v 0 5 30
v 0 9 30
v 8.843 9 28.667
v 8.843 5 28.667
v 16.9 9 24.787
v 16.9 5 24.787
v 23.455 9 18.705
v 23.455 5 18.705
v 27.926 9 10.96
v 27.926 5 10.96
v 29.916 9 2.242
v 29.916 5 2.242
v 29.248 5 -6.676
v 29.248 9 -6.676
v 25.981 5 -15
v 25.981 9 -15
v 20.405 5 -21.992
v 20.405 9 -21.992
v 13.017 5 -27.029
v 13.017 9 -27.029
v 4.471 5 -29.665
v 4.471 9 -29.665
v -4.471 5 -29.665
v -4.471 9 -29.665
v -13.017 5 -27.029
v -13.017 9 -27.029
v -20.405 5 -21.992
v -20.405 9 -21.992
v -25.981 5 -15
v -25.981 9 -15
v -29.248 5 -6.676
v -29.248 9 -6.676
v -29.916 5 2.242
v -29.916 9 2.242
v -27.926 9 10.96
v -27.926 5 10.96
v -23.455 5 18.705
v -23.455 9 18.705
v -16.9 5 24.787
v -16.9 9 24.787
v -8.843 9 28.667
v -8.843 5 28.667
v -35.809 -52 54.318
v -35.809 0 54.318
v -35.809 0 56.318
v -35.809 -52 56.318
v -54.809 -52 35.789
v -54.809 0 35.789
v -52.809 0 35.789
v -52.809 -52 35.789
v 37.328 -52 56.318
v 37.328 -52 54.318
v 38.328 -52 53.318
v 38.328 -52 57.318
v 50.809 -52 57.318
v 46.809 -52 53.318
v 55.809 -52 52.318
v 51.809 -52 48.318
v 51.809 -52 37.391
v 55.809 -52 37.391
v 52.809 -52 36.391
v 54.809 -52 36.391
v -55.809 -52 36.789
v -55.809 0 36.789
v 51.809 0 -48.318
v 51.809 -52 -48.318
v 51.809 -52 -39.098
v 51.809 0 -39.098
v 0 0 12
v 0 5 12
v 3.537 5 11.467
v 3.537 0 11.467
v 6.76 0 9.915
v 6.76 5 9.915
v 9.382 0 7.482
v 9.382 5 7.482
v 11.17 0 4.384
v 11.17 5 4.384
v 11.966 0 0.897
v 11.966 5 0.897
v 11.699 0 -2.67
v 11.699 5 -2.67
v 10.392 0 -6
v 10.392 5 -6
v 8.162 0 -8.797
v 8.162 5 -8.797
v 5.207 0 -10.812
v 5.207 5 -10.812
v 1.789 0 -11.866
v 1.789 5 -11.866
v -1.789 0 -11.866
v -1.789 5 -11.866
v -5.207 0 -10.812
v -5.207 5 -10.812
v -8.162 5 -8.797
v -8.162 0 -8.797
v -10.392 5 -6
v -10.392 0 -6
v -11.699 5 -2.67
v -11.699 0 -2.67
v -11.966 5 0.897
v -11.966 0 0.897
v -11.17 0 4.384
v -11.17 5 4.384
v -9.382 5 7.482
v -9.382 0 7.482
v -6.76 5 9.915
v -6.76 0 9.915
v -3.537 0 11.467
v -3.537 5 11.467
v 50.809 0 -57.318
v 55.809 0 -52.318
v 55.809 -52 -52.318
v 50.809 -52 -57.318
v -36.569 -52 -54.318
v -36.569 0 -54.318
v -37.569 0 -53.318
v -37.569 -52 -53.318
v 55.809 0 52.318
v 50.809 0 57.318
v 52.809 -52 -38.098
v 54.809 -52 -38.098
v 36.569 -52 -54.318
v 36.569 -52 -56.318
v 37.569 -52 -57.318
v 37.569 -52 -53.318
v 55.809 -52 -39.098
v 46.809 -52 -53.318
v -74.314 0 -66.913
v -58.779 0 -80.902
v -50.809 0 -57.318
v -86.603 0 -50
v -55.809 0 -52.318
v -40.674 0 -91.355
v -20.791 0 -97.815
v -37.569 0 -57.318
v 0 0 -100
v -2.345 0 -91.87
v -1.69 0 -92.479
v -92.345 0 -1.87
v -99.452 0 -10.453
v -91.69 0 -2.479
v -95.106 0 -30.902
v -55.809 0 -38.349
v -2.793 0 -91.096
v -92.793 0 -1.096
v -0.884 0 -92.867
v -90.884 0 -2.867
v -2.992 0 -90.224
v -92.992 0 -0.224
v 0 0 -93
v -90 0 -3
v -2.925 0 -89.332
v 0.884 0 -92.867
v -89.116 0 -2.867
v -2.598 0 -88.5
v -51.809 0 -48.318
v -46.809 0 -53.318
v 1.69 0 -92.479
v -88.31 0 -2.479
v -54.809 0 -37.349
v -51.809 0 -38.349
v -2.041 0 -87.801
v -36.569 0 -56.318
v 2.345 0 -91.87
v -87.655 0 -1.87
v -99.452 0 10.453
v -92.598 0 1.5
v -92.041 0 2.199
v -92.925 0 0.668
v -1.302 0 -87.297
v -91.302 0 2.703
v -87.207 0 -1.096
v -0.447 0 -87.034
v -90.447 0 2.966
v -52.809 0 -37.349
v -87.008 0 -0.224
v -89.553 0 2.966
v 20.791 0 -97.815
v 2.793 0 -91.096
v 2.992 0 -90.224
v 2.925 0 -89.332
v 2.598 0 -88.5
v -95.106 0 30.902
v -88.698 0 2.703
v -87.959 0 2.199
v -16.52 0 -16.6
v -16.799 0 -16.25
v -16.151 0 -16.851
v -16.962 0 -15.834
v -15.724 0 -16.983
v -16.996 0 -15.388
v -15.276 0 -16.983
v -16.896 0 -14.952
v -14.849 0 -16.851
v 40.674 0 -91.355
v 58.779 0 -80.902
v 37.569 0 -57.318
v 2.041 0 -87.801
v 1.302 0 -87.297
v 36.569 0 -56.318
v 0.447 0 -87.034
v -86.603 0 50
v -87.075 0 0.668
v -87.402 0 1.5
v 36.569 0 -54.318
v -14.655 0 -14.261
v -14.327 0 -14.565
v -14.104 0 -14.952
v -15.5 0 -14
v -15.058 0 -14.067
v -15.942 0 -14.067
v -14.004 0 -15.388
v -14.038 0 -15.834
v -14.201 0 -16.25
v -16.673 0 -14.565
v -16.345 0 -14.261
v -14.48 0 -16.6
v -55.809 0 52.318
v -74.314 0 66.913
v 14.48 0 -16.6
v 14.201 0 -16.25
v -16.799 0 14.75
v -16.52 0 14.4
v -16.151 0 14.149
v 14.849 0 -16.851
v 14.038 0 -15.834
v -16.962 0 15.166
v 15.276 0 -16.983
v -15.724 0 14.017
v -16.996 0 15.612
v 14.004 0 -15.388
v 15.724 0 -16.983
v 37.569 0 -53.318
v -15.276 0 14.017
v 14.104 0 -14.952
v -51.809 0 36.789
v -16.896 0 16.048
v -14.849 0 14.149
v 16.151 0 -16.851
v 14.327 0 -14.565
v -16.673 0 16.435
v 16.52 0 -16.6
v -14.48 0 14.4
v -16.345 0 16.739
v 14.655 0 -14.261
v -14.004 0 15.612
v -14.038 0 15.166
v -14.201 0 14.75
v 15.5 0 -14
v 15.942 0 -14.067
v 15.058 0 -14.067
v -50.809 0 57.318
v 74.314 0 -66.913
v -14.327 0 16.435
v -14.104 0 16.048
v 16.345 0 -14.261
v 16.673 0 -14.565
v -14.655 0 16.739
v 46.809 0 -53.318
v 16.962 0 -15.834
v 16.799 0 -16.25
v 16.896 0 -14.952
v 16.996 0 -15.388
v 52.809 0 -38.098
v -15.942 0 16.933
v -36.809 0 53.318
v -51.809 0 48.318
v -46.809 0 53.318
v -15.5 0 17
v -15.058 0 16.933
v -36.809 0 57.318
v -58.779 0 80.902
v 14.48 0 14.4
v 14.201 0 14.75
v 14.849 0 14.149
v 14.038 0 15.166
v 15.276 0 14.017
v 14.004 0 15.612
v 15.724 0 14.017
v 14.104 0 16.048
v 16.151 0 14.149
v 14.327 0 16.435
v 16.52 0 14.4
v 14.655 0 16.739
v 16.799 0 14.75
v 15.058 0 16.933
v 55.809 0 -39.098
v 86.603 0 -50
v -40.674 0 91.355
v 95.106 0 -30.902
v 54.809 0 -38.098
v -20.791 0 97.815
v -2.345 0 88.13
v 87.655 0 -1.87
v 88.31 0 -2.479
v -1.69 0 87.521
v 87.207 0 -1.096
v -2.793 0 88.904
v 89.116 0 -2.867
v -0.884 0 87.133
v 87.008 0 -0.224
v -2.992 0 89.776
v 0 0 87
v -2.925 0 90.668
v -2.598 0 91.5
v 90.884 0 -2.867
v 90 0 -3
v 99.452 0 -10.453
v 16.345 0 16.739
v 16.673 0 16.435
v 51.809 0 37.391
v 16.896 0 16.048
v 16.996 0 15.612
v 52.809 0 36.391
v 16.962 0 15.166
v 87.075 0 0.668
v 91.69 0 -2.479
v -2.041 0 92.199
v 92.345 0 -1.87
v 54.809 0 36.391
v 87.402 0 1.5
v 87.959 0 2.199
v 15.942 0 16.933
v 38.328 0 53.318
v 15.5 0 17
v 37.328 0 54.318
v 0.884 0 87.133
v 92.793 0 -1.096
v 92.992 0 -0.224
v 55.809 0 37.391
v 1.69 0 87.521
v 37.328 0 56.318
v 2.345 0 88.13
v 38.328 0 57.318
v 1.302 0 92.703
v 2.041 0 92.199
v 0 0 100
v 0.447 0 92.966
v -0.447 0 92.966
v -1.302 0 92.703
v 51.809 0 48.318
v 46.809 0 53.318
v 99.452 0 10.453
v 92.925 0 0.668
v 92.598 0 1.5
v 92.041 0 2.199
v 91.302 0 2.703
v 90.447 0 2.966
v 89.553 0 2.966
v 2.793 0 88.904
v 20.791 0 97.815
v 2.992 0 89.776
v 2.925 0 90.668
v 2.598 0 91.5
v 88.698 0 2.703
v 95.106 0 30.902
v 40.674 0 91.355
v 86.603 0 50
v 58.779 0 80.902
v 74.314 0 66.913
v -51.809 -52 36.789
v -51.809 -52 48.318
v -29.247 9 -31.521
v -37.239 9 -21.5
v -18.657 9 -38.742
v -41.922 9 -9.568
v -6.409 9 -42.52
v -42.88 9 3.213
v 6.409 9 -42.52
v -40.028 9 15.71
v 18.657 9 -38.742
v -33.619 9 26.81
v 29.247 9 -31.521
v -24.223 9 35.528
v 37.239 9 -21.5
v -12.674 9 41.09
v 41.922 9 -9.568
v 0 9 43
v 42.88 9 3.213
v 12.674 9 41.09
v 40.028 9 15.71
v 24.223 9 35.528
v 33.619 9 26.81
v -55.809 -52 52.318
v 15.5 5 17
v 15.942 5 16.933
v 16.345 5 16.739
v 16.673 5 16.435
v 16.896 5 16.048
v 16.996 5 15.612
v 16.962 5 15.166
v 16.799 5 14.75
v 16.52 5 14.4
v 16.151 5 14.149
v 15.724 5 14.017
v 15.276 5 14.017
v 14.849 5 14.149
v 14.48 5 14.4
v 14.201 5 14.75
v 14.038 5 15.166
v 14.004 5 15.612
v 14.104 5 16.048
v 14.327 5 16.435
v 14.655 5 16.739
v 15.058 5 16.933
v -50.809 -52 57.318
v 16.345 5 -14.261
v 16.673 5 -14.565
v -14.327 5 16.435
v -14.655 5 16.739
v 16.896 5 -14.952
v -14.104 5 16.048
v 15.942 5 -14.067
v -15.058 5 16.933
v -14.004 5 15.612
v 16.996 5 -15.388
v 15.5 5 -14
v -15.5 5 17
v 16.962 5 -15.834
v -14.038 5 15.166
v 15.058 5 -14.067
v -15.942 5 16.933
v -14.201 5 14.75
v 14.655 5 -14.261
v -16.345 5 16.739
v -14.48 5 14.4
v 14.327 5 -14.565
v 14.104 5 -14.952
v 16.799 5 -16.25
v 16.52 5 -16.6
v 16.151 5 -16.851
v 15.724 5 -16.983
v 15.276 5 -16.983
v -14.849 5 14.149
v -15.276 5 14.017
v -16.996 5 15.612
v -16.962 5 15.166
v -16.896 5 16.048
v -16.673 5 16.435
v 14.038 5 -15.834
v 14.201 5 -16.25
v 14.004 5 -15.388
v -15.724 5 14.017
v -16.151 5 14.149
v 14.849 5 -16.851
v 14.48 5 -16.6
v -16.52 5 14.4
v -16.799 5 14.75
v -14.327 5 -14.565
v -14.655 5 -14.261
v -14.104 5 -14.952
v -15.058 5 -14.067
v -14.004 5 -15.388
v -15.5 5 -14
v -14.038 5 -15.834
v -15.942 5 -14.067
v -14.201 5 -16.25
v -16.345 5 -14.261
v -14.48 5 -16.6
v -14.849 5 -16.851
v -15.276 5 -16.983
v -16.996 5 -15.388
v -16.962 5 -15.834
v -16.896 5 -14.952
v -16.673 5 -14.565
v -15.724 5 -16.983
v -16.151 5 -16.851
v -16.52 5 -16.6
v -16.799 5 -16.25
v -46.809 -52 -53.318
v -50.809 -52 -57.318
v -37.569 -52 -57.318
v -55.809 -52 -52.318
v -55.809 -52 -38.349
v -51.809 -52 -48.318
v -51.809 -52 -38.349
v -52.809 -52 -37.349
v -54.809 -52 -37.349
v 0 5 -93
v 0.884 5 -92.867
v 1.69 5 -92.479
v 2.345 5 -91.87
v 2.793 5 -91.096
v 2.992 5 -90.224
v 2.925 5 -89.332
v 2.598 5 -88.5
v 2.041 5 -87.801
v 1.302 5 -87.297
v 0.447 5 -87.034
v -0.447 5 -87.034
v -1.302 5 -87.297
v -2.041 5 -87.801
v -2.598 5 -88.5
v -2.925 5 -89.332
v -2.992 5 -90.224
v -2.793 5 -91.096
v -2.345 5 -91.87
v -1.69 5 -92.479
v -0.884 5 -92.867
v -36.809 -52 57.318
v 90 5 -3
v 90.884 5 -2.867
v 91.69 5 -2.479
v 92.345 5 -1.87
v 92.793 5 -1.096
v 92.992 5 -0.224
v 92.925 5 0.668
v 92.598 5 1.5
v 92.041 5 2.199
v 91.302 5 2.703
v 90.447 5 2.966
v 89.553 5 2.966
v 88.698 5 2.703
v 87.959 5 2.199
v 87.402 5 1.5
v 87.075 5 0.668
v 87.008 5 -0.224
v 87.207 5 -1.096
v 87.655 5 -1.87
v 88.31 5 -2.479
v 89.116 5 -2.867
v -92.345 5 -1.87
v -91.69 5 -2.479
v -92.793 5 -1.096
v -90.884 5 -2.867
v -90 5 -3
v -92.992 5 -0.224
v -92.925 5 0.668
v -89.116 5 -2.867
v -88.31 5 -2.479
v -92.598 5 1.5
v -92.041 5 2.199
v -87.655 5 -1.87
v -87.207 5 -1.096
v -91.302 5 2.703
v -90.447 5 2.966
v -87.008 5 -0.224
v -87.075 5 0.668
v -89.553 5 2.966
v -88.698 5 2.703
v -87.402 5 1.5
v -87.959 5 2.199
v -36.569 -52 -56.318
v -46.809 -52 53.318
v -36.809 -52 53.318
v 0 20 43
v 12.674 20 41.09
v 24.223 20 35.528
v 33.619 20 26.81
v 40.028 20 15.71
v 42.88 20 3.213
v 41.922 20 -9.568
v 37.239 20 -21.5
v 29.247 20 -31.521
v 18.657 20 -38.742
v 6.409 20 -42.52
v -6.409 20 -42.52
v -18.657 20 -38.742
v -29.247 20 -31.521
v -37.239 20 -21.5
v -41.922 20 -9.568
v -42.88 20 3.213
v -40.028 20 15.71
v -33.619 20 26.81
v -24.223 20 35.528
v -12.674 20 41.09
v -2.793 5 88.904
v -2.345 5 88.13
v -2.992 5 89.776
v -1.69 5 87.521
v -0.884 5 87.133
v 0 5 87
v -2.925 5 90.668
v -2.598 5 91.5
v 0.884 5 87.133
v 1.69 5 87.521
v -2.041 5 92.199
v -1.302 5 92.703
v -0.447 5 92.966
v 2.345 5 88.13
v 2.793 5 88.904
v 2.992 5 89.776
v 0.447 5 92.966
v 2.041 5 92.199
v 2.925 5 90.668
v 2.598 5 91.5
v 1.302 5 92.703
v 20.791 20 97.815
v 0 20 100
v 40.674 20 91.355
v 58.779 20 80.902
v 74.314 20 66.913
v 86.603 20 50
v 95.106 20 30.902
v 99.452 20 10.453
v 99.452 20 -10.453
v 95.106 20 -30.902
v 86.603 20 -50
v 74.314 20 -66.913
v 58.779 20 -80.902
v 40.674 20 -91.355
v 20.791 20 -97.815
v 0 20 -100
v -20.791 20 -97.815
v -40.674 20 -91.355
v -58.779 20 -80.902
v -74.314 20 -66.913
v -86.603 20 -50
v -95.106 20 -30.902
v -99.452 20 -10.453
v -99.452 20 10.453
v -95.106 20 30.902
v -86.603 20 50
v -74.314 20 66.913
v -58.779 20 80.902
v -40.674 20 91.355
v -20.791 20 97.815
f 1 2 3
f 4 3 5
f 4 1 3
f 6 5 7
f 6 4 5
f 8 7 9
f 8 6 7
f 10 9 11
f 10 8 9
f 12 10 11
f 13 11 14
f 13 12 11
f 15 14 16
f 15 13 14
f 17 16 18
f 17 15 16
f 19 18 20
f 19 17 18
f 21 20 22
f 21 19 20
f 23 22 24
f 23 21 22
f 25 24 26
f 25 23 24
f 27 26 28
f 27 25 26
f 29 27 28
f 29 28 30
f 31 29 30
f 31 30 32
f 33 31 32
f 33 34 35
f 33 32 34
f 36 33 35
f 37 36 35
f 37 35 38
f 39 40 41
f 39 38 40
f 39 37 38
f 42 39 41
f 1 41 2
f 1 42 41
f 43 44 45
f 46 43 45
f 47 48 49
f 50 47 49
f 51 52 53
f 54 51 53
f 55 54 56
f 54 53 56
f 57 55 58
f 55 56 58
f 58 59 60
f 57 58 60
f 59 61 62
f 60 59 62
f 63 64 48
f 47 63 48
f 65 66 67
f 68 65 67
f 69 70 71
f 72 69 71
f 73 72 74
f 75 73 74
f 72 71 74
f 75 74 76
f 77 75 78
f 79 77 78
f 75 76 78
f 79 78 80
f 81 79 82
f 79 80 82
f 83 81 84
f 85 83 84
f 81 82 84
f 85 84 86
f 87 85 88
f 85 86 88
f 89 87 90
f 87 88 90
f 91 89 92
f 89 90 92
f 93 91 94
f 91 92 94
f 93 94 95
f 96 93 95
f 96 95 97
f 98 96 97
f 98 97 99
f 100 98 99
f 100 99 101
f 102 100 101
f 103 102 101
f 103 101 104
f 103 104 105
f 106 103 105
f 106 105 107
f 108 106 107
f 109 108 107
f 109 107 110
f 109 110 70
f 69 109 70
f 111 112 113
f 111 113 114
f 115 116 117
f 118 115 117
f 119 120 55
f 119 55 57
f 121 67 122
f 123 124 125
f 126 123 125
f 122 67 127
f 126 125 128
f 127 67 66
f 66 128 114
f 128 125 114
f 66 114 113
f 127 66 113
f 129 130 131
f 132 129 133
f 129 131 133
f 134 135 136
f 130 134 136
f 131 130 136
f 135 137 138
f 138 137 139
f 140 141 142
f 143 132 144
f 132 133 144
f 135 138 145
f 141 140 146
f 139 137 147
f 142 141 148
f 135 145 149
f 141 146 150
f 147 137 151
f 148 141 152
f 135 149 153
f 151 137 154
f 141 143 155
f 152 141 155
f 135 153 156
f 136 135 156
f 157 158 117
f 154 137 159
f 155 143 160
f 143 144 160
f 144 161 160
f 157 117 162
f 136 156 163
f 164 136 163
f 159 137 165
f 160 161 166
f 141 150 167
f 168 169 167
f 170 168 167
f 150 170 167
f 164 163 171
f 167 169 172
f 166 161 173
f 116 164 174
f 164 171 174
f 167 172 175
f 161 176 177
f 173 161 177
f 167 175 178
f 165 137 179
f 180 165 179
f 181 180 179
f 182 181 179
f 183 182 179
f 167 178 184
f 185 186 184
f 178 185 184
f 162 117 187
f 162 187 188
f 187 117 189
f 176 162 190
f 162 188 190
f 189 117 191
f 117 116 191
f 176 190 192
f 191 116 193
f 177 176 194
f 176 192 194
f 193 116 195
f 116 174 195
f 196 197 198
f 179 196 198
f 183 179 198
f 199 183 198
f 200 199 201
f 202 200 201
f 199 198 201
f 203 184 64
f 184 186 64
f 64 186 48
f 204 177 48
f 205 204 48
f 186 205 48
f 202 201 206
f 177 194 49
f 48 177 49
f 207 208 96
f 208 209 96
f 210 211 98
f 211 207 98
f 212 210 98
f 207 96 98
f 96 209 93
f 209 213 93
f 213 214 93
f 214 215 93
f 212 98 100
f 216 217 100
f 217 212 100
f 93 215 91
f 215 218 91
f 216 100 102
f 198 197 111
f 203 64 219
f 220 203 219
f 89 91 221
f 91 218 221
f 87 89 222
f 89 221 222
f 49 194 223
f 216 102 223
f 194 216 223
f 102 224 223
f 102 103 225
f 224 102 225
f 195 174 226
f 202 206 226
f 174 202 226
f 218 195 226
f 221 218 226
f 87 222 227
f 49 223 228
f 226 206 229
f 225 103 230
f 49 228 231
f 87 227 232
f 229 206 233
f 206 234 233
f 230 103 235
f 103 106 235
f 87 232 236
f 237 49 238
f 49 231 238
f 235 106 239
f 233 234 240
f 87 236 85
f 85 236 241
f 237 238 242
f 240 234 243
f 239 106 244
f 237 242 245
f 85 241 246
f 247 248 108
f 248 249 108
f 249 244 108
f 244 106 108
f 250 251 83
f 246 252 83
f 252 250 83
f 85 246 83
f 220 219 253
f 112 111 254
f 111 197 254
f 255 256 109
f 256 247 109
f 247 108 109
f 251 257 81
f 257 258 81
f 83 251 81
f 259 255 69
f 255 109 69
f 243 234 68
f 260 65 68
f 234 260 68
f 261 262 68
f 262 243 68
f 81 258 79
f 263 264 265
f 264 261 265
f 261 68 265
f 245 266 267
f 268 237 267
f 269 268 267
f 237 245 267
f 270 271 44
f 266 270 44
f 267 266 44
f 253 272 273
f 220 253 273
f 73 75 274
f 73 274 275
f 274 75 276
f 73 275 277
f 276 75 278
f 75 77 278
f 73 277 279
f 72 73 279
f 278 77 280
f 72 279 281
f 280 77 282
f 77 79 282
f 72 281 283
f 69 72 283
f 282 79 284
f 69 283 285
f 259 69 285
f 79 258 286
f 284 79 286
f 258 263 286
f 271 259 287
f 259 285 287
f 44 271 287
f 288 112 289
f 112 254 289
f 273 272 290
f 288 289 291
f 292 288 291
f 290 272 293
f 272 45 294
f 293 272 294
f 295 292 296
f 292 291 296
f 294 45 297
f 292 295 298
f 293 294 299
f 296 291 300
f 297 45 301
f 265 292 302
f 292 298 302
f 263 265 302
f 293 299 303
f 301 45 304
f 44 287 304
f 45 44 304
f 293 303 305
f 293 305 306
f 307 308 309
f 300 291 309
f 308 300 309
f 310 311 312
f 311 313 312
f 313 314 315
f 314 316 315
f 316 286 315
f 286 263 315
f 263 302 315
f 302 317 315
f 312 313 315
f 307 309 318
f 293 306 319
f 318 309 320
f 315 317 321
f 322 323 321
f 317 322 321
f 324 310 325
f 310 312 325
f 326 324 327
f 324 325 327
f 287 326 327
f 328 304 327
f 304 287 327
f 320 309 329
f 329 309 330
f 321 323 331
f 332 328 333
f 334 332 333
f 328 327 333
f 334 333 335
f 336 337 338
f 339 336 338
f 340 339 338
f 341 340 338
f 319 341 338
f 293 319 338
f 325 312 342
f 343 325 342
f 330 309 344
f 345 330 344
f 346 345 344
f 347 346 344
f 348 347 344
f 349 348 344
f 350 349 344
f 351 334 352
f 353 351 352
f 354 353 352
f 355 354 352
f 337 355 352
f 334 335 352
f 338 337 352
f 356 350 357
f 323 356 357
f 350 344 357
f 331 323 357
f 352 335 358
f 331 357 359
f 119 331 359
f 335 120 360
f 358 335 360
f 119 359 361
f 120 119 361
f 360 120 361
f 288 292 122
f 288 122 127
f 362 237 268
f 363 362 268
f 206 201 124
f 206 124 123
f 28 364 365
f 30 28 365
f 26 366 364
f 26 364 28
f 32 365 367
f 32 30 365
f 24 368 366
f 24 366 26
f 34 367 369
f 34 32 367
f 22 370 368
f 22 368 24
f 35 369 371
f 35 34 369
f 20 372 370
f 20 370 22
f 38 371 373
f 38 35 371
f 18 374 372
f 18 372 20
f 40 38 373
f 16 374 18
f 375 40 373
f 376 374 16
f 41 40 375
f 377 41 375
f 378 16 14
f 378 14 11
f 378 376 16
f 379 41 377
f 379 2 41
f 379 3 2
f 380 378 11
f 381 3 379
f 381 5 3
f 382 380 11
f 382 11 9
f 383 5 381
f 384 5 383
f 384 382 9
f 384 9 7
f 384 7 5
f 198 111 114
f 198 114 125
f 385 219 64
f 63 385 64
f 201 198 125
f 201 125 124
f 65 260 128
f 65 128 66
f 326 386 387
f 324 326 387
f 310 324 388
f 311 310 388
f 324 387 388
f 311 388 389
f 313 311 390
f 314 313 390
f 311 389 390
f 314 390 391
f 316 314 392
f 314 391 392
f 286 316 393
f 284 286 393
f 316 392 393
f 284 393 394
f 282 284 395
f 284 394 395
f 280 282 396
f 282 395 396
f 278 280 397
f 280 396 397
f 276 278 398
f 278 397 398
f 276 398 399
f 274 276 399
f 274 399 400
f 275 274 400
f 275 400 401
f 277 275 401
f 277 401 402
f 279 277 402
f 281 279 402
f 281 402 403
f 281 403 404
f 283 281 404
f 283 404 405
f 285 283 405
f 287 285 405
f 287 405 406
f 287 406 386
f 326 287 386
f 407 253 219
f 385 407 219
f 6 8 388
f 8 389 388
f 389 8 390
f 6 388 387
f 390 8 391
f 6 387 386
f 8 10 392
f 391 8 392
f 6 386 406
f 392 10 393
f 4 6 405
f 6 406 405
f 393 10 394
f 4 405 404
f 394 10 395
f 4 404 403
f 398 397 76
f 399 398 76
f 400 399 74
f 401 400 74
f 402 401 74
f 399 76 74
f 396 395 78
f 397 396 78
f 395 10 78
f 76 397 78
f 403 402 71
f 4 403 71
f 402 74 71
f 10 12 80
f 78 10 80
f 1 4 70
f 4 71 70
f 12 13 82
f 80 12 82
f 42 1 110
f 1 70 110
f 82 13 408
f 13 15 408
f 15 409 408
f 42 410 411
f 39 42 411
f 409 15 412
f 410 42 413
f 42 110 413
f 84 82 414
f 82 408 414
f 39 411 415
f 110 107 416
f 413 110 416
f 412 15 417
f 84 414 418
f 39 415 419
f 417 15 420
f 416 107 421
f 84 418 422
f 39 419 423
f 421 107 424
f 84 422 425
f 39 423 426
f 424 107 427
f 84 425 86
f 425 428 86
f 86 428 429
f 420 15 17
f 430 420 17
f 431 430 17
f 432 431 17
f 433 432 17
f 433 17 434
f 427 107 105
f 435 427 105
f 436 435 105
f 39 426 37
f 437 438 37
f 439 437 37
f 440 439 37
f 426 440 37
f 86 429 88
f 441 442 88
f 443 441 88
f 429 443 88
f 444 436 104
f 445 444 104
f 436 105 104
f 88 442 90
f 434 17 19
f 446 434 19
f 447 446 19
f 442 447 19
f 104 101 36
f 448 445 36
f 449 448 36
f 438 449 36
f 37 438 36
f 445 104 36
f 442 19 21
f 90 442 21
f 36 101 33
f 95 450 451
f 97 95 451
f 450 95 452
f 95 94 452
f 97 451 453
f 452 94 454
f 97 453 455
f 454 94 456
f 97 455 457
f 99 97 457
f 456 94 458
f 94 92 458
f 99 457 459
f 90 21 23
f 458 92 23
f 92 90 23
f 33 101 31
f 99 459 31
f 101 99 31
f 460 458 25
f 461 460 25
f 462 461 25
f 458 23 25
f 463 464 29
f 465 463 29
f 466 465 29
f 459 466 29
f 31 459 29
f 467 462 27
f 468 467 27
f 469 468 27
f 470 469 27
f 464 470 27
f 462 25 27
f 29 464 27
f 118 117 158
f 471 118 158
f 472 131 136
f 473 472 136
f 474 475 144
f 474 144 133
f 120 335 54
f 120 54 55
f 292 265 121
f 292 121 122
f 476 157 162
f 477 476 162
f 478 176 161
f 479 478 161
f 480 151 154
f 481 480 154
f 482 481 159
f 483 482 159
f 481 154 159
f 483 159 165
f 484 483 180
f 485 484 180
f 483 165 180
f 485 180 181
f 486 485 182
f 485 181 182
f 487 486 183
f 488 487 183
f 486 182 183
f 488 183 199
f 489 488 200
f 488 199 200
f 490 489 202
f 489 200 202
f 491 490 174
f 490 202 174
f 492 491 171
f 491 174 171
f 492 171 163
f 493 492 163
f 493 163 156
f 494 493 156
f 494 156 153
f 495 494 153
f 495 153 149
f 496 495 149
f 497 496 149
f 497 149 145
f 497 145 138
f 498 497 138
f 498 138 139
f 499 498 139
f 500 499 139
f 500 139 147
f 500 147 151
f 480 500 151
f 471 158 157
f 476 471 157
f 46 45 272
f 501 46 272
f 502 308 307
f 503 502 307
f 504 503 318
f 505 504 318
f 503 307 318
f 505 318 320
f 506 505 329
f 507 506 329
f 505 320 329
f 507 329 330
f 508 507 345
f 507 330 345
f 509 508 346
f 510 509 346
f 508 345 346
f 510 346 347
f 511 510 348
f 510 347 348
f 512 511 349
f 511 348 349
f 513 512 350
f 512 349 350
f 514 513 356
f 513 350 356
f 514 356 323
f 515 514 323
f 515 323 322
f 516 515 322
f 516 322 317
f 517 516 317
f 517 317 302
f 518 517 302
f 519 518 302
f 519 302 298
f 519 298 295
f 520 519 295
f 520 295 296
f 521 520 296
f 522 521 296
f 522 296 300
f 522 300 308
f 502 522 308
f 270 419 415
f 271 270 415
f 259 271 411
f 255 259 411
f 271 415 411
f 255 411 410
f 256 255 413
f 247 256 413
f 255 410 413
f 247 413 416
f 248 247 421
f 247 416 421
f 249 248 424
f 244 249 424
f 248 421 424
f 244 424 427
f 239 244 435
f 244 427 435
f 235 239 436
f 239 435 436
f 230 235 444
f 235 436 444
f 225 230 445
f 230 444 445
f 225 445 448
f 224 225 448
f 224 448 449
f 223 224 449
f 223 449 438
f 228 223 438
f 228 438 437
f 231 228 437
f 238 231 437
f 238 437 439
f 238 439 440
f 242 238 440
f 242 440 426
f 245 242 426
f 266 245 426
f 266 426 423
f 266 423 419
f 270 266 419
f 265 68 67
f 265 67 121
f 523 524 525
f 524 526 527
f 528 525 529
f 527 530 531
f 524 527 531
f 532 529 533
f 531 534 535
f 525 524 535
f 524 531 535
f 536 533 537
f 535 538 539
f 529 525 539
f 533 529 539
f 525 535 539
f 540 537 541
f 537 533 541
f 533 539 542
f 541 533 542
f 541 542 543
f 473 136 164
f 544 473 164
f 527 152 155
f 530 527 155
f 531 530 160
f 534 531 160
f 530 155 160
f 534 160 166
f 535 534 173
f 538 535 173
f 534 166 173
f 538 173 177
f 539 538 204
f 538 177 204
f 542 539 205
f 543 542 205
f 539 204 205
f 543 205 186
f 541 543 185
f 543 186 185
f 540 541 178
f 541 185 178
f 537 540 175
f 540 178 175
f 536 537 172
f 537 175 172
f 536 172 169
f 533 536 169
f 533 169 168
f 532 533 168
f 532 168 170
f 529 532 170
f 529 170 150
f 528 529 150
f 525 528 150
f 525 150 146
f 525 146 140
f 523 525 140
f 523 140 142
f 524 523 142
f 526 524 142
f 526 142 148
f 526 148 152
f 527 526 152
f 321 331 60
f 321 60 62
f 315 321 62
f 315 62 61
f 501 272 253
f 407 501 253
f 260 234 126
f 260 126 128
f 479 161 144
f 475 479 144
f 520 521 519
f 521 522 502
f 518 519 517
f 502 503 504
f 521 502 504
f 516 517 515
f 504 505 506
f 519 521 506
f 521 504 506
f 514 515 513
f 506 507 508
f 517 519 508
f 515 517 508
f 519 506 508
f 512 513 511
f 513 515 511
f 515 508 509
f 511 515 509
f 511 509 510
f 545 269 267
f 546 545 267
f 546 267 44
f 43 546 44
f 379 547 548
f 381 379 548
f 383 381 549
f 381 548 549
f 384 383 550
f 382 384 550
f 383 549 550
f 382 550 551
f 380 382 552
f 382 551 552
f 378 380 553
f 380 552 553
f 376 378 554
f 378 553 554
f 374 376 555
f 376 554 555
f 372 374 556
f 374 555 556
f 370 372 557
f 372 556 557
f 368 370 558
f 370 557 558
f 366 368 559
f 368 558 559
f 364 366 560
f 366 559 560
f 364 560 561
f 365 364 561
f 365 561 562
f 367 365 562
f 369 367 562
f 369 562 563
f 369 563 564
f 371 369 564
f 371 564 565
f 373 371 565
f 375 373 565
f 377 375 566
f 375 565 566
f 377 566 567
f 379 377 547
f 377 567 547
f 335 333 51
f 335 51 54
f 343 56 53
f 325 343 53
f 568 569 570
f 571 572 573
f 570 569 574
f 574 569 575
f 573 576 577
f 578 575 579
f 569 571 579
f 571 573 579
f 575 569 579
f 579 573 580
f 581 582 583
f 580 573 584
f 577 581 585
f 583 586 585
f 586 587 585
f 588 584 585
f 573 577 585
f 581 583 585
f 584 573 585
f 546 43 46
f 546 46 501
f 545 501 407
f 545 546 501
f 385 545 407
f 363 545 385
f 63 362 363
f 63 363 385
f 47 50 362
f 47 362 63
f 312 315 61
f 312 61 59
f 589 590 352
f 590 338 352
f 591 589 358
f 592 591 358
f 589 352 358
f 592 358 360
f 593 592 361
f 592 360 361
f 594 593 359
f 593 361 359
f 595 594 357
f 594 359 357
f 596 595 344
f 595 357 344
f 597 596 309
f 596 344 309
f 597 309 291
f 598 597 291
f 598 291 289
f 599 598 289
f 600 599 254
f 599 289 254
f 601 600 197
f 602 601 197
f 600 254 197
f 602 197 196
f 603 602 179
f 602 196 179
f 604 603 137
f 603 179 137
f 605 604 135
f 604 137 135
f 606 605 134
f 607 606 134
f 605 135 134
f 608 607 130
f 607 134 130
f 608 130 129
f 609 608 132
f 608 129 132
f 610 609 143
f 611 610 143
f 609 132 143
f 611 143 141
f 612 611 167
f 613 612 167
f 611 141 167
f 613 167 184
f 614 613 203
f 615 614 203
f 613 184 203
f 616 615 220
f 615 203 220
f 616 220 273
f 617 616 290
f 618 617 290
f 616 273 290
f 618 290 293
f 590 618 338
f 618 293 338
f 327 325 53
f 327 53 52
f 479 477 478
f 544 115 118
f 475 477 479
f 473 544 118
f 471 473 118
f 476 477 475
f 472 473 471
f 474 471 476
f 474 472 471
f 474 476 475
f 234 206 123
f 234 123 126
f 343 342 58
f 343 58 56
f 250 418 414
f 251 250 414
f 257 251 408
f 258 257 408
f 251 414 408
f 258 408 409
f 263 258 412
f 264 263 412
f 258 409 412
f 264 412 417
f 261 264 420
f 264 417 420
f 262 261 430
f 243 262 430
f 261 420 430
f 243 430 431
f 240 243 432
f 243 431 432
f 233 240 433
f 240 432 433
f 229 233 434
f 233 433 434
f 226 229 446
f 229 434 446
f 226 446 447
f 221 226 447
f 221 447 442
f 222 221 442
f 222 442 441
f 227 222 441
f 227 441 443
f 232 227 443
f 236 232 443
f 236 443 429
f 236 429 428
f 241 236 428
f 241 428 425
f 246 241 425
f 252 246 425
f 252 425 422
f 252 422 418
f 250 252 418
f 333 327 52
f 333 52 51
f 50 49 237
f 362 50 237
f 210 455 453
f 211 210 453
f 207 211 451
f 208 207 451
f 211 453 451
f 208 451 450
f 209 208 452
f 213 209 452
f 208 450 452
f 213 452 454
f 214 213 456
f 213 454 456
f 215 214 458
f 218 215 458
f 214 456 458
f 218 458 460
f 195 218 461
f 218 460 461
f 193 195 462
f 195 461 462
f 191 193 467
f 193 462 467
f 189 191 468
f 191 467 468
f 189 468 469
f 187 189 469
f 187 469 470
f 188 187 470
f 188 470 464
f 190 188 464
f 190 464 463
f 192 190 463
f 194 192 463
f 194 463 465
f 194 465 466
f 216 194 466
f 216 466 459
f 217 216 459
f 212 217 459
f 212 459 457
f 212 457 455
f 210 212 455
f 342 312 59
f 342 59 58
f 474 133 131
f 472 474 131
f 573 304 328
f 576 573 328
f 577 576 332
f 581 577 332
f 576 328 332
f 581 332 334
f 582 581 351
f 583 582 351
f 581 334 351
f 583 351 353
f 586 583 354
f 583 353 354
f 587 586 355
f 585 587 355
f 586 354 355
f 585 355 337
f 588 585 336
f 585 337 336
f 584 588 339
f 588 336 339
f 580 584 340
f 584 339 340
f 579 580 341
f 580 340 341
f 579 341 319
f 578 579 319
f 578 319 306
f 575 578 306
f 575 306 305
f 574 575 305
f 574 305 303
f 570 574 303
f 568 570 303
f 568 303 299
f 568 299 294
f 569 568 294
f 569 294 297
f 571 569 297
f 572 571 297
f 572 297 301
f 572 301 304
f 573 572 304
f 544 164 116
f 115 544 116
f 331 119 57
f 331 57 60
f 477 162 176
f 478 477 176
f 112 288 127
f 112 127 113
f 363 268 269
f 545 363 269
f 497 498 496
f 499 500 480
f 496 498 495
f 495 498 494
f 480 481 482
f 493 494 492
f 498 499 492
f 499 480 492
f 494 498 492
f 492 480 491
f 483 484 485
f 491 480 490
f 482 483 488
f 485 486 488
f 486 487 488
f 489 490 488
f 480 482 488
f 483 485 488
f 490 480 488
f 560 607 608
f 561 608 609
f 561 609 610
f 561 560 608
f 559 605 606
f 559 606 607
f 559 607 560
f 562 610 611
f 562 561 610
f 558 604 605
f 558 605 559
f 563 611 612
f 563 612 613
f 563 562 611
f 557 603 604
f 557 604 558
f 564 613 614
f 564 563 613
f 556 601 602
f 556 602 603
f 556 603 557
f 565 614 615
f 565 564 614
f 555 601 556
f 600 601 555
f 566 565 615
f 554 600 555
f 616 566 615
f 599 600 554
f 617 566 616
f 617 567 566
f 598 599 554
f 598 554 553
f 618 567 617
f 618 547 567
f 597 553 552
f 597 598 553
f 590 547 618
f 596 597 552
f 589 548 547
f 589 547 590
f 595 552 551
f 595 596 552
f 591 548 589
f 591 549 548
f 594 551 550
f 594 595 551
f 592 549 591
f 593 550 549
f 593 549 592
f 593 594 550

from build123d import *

# Parameters (mm, degrees)
SKETCH_1_R          = 100
EXTRUDE_1_DEPTH     = 5
SKETCH_3_R          = 3
CUT_EXTRUDE_1_DEPTH = 142.509716981
SKETCH_5_R          = 1.5
CUT_EXTRUDE_2_DEPTH = 142.509716981
SKETCH_6_R          = 12
CUT_EXTRUDE_3_DEPTH = 142.509716981
EXTRUDE_2_DEPTH     = 57
SKETCH_9_R          = 100
SKETCH_9_R_2        = 30
EXTRUDE_4_DEPTH     = 15
SKETCH_10_R         = 43
CUT_EXTRUDE_4_DEPTH = 11


with BuildPart() as part:
    # 草图1 → 凸台-拉伸1 (new body)
    with BuildSketch(Plane(origin=(0, 0, 0), x_dir=(1, 0, 0), z_dir=(0, 1, 0))):
        with Locations(Location((0, 0, 0), (0, 0, 270))):
            Circle(SKETCH_1_R)
    extrude(amount=EXTRUDE_1_DEPTH)

    # 草图3 → 切除-拉伸1 (cut, through all)
    with BuildSketch(Plane.XZ):
        with Locations(Location((0, 90, 0), (0, 0, 270))):
            Circle(SKETCH_3_R)
        with Locations(Location((90, 0, 0), (0, 0, 270))):
            Circle(SKETCH_3_R)
        with Locations(Location((0, -90, 0), (0, 0, 270))):
            Circle(SKETCH_3_R)
        with Locations(Location((-90, 0, 0), (0, 0, 270))):
            Circle(SKETCH_3_R)
    extrude(amount=-CUT_EXTRUDE_1_DEPTH, mode=Mode.SUBTRACT)

    # 草图5 → 切除-拉伸2 (cut, through all)
    with BuildSketch(Plane(origin=(0, 5, 0), x_dir=(1, 0, 0), z_dir=(0, 1, 0))):
        with Locations(Location((-15.5, 15.5, 0), (0, 0, 270))):
            Circle(SKETCH_5_R)
        with Locations(Location((15.5, 15.5, 0), (0, 0, 270))):
            Circle(SKETCH_5_R)
        with Locations(Location((-15.5, -15.5, 0), (0, 0, 270))):
            Circle(SKETCH_5_R)
        with Locations(Location((15.5, -15.5, 0), (0, 0, 270))):
            Circle(SKETCH_5_R)
    extrude(amount=-CUT_EXTRUDE_2_DEPTH, mode=Mode.SUBTRACT)

    # 草图6 → 切除-拉伸3 (cut, through all)
    with BuildSketch(Plane(origin=(0, 5, 0), x_dir=(1, 0, 0), z_dir=(0, 1, 0))):
        with Locations(Location((0, 0, 0), (0, 0, 270))):
            Circle(SKETCH_6_R)
    extrude(amount=-CUT_EXTRUDE_3_DEPTH, mode=Mode.SUBTRACT)

    # 草图7 → 凸台-拉伸2 (add)
    with BuildSketch(Plane(origin=(0, 5, 0), x_dir=(1, 0, 0), z_dir=(0, 1, 0))):
        Polygon((-50.809093778, 57.317929583), (-37.568542495, 57.317929583), (-36.568542495, 56.317929583), (-36.568542495, 54.317929583), (-37.568542495, 53.317929583), (-46.809093778, 53.317929583), (-51.809093778, 48.317929583), (-51.809093778, 38.348523411), (-52.809093778, 37.348523411), (-54.809093778, 37.348523411), (-55.809093778, 38.348523411), (-55.809093778, 52.317929583), align=None)
        Polygon((-55.809093778, -52.317929583), (-55.809093778, -36.788561579), (-54.809093778, -35.788561579), (-52.809093778, -35.788561579), (-51.809093778, -36.788561579), (-51.809093778, -48.317929583), (-46.809093778, -53.317929583), (-36.809093778, -53.317929583), (-35.809093778, -54.317929583), (-35.809093778, -56.317929583), (-36.809093778, -57.317929583), (-50.809093778, -57.317929583), align=None)
        Polygon((55.809093778, -52.317929583), (55.809093778, -37.390513406), (54.809093778, -36.390513406), (52.809093778, -36.390513406), (51.809093778, -37.390513406), (51.809093778, -48.317929583), (46.809093778, -53.317929583), (38.327991212, -53.317929583), (37.327991212, -54.317929583), (37.327991212, -56.317929583), (38.327991212, -57.317929583), (50.809093778, -57.317929583), align=None)
        Polygon((50.809093778, 57.317929583), (37.568542495, 57.317929583), (36.568542495, 56.317929583), (36.568542495, 54.317929583), (37.568542495, 53.317929583), (46.809093778, 53.317929583), (51.809093778, 48.317929583), (51.809093778, 39.097910499), (52.809093778, 38.097910499), (54.809093778, 38.097910499), (55.809093778, 39.097910499), (55.809093778, 52.317929583), align=None)
    extrude(amount=-EXTRUDE_2_DEPTH)

    # 草图9 → 凸台-拉伸4 (add)
    with BuildSketch(Plane(origin=(0, 5, 0), x_dir=(1, 0, 0), z_dir=(0, 1, 0))):
        with Locations(Location((0, 0, 0), (0, 0, 270))):
            Circle(SKETCH_9_R)
        with Locations(Location((0, 0, 0), (0, 0, 270))):
            Circle(SKETCH_9_R_2, mode=Mode.SUBTRACT)
    extrude(amount=EXTRUDE_4_DEPTH)

    # 草图10 → 切除-拉伸4 (cut)
    with BuildSketch(Plane(origin=(0, 20, 0), x_dir=(1, 0, 0), z_dir=(0, 1, 0))):
        with Locations(Location((0, 0, 0), (0, 0, 270))):
            Circle(SKETCH_10_R)
    extrude(amount=-CUT_EXTRUDE_4_DEPTH, mode=Mode.SUBTRACT)


solid = part.part
